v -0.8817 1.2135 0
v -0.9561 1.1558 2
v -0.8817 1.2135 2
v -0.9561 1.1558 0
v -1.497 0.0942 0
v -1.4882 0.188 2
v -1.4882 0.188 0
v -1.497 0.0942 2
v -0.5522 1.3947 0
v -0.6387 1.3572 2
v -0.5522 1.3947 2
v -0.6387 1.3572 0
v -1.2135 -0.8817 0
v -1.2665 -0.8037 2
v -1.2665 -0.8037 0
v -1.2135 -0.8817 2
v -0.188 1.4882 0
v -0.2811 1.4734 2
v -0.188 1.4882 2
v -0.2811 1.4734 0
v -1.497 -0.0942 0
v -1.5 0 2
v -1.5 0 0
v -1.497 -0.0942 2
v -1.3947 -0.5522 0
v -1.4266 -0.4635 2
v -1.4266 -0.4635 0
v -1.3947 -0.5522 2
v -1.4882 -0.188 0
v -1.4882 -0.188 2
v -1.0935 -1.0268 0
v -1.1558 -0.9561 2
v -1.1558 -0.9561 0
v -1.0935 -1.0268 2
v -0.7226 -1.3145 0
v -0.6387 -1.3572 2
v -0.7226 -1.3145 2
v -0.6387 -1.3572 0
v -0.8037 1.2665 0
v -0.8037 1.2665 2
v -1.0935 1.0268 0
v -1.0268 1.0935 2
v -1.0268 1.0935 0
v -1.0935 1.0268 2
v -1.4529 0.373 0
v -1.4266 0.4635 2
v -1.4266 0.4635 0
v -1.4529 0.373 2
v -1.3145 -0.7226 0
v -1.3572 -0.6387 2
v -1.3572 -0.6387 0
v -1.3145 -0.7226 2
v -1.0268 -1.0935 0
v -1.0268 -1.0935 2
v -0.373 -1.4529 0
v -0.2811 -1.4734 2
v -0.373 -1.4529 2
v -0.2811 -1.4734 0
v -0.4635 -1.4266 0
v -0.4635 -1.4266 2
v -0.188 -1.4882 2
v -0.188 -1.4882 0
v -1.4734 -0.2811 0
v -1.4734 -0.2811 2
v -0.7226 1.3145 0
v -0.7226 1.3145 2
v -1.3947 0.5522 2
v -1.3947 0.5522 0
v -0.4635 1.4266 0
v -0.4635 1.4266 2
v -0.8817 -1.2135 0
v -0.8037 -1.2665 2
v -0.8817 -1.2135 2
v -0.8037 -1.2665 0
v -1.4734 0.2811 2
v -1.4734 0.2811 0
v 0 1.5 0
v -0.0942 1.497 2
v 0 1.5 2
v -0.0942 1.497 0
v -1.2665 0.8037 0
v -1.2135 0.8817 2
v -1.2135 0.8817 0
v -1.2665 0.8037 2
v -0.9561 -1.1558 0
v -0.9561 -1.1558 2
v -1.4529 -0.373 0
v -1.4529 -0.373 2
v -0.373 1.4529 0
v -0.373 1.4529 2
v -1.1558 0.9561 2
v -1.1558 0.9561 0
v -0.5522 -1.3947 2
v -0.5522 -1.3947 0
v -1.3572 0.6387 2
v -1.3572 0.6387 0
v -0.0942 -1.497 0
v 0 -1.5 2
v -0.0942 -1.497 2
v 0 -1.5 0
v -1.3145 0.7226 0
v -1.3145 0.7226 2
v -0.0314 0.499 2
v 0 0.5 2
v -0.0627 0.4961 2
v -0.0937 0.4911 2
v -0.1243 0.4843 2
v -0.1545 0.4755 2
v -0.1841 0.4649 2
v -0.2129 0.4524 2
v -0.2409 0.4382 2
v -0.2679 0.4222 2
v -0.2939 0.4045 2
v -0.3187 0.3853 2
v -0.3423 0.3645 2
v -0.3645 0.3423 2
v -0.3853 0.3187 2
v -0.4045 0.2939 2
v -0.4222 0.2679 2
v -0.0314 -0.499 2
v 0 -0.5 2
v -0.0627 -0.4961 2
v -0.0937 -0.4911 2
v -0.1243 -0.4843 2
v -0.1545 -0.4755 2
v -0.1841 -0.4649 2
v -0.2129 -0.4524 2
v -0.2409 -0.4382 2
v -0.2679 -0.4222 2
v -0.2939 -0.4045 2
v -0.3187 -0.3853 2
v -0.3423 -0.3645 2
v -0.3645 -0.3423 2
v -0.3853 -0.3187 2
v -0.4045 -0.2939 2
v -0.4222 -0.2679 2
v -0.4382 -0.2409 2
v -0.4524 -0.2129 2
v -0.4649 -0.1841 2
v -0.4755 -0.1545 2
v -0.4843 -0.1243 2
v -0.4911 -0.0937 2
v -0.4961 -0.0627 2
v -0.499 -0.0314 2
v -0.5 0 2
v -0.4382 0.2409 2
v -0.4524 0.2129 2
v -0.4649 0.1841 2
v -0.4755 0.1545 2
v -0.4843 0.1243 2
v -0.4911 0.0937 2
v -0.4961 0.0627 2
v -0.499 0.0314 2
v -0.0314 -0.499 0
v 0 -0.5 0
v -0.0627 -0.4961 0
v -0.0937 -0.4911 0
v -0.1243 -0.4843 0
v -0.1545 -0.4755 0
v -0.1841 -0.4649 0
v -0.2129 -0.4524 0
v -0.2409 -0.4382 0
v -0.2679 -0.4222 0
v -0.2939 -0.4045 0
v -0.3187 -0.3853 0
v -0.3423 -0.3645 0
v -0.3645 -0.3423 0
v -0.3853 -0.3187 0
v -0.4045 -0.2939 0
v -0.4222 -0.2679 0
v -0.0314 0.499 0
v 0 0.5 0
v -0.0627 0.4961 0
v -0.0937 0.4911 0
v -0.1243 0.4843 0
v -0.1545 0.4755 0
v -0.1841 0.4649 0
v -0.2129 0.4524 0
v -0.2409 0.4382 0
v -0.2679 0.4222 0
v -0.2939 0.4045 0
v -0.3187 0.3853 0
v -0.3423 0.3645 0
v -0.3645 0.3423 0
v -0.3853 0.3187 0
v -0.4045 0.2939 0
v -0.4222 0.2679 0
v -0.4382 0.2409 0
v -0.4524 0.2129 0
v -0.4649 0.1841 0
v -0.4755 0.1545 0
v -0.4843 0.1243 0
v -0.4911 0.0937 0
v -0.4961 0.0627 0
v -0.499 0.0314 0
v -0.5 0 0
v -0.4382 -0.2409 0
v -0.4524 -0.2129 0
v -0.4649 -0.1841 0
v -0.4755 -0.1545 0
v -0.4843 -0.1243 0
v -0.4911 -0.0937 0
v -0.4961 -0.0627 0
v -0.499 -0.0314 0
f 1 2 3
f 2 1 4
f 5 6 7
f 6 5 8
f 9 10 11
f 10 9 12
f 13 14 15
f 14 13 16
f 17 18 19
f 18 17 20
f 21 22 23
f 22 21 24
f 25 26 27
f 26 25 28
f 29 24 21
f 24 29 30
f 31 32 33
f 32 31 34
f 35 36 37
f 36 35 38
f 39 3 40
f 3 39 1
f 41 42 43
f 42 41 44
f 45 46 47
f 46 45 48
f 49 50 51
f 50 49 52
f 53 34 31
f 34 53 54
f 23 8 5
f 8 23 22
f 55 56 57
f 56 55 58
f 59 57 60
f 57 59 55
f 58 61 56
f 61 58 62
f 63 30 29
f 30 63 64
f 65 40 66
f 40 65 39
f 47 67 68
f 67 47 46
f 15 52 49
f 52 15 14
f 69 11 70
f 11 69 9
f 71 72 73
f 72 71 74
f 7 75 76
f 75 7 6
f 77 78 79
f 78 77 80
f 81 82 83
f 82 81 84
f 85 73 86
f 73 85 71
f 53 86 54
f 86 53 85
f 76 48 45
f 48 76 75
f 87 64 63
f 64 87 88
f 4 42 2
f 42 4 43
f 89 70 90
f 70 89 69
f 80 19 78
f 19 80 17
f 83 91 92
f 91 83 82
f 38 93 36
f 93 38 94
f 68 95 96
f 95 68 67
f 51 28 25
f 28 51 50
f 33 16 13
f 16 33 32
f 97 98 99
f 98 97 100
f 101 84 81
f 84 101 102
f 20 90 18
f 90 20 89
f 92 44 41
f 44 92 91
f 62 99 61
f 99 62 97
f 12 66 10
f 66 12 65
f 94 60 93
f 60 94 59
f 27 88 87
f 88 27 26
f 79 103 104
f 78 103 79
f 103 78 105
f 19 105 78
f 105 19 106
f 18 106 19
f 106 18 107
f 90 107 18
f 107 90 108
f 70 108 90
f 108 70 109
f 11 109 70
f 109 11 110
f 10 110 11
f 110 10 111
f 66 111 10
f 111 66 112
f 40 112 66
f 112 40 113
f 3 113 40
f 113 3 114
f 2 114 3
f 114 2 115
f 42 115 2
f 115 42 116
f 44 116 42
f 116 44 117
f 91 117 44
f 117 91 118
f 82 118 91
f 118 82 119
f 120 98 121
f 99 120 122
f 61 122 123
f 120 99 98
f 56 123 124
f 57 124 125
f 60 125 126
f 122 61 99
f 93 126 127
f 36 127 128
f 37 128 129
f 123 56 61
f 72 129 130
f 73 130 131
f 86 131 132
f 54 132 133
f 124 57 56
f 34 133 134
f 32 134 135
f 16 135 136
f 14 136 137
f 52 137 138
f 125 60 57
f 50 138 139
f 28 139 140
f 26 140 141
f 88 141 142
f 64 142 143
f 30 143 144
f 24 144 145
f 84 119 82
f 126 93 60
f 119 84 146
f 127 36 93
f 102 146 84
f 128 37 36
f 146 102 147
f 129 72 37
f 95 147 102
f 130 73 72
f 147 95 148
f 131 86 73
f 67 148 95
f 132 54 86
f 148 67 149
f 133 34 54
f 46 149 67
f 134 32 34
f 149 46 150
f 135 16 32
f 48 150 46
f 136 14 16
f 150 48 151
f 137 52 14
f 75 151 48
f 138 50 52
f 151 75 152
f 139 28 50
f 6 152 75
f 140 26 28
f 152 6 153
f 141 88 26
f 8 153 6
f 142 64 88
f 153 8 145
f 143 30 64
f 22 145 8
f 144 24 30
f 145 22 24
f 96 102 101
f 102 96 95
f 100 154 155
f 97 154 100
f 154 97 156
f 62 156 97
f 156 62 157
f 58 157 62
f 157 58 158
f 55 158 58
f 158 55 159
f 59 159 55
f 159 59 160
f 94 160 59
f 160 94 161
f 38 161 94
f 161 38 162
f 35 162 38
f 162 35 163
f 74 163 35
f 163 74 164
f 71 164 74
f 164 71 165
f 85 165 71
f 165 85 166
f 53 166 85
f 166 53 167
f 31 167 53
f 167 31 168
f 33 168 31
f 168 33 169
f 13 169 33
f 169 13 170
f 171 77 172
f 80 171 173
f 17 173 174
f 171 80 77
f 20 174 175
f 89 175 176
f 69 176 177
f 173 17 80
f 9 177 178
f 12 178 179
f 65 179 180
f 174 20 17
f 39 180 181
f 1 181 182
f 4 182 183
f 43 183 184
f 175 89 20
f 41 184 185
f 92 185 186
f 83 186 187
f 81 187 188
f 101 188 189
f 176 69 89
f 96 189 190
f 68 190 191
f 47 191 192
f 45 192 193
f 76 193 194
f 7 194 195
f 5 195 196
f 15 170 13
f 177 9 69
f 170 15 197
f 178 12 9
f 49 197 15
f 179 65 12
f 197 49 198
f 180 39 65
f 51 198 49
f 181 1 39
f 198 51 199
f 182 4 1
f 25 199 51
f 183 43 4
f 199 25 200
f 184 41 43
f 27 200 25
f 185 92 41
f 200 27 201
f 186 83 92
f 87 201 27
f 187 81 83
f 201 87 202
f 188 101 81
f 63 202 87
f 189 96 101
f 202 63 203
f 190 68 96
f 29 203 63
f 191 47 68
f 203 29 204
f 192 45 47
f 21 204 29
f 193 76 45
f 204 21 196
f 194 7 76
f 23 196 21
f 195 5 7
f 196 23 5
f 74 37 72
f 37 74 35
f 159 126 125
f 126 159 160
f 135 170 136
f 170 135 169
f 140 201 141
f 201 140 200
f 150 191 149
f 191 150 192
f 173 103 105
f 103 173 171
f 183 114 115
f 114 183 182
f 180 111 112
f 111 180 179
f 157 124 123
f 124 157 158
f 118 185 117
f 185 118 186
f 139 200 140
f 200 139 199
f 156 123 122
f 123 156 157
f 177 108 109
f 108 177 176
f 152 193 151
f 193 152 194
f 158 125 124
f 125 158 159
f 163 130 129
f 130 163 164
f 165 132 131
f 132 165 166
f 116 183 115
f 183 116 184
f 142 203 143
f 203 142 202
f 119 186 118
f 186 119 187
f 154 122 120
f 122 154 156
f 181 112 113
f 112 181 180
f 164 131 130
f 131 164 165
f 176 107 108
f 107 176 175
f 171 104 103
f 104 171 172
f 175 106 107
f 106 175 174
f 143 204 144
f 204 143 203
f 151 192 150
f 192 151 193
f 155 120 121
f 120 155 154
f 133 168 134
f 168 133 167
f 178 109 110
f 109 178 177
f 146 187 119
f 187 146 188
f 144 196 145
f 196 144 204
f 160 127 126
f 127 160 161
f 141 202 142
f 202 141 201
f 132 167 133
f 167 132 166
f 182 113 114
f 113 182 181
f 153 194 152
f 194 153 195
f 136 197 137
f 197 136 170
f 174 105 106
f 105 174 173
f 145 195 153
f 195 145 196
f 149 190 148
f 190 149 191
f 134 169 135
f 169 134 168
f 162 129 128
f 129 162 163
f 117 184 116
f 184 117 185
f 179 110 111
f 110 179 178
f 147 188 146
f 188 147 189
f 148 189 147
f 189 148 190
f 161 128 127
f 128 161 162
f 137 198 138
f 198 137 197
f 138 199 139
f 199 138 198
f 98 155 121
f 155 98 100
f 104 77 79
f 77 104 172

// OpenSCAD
$fn=100;

difference() {
    cylinder(2,1.5,1.5);
    cylinder(2.1,0.5,0.5);
    translate([4,0,0])
        cube([8,8,8],center = true);
}
